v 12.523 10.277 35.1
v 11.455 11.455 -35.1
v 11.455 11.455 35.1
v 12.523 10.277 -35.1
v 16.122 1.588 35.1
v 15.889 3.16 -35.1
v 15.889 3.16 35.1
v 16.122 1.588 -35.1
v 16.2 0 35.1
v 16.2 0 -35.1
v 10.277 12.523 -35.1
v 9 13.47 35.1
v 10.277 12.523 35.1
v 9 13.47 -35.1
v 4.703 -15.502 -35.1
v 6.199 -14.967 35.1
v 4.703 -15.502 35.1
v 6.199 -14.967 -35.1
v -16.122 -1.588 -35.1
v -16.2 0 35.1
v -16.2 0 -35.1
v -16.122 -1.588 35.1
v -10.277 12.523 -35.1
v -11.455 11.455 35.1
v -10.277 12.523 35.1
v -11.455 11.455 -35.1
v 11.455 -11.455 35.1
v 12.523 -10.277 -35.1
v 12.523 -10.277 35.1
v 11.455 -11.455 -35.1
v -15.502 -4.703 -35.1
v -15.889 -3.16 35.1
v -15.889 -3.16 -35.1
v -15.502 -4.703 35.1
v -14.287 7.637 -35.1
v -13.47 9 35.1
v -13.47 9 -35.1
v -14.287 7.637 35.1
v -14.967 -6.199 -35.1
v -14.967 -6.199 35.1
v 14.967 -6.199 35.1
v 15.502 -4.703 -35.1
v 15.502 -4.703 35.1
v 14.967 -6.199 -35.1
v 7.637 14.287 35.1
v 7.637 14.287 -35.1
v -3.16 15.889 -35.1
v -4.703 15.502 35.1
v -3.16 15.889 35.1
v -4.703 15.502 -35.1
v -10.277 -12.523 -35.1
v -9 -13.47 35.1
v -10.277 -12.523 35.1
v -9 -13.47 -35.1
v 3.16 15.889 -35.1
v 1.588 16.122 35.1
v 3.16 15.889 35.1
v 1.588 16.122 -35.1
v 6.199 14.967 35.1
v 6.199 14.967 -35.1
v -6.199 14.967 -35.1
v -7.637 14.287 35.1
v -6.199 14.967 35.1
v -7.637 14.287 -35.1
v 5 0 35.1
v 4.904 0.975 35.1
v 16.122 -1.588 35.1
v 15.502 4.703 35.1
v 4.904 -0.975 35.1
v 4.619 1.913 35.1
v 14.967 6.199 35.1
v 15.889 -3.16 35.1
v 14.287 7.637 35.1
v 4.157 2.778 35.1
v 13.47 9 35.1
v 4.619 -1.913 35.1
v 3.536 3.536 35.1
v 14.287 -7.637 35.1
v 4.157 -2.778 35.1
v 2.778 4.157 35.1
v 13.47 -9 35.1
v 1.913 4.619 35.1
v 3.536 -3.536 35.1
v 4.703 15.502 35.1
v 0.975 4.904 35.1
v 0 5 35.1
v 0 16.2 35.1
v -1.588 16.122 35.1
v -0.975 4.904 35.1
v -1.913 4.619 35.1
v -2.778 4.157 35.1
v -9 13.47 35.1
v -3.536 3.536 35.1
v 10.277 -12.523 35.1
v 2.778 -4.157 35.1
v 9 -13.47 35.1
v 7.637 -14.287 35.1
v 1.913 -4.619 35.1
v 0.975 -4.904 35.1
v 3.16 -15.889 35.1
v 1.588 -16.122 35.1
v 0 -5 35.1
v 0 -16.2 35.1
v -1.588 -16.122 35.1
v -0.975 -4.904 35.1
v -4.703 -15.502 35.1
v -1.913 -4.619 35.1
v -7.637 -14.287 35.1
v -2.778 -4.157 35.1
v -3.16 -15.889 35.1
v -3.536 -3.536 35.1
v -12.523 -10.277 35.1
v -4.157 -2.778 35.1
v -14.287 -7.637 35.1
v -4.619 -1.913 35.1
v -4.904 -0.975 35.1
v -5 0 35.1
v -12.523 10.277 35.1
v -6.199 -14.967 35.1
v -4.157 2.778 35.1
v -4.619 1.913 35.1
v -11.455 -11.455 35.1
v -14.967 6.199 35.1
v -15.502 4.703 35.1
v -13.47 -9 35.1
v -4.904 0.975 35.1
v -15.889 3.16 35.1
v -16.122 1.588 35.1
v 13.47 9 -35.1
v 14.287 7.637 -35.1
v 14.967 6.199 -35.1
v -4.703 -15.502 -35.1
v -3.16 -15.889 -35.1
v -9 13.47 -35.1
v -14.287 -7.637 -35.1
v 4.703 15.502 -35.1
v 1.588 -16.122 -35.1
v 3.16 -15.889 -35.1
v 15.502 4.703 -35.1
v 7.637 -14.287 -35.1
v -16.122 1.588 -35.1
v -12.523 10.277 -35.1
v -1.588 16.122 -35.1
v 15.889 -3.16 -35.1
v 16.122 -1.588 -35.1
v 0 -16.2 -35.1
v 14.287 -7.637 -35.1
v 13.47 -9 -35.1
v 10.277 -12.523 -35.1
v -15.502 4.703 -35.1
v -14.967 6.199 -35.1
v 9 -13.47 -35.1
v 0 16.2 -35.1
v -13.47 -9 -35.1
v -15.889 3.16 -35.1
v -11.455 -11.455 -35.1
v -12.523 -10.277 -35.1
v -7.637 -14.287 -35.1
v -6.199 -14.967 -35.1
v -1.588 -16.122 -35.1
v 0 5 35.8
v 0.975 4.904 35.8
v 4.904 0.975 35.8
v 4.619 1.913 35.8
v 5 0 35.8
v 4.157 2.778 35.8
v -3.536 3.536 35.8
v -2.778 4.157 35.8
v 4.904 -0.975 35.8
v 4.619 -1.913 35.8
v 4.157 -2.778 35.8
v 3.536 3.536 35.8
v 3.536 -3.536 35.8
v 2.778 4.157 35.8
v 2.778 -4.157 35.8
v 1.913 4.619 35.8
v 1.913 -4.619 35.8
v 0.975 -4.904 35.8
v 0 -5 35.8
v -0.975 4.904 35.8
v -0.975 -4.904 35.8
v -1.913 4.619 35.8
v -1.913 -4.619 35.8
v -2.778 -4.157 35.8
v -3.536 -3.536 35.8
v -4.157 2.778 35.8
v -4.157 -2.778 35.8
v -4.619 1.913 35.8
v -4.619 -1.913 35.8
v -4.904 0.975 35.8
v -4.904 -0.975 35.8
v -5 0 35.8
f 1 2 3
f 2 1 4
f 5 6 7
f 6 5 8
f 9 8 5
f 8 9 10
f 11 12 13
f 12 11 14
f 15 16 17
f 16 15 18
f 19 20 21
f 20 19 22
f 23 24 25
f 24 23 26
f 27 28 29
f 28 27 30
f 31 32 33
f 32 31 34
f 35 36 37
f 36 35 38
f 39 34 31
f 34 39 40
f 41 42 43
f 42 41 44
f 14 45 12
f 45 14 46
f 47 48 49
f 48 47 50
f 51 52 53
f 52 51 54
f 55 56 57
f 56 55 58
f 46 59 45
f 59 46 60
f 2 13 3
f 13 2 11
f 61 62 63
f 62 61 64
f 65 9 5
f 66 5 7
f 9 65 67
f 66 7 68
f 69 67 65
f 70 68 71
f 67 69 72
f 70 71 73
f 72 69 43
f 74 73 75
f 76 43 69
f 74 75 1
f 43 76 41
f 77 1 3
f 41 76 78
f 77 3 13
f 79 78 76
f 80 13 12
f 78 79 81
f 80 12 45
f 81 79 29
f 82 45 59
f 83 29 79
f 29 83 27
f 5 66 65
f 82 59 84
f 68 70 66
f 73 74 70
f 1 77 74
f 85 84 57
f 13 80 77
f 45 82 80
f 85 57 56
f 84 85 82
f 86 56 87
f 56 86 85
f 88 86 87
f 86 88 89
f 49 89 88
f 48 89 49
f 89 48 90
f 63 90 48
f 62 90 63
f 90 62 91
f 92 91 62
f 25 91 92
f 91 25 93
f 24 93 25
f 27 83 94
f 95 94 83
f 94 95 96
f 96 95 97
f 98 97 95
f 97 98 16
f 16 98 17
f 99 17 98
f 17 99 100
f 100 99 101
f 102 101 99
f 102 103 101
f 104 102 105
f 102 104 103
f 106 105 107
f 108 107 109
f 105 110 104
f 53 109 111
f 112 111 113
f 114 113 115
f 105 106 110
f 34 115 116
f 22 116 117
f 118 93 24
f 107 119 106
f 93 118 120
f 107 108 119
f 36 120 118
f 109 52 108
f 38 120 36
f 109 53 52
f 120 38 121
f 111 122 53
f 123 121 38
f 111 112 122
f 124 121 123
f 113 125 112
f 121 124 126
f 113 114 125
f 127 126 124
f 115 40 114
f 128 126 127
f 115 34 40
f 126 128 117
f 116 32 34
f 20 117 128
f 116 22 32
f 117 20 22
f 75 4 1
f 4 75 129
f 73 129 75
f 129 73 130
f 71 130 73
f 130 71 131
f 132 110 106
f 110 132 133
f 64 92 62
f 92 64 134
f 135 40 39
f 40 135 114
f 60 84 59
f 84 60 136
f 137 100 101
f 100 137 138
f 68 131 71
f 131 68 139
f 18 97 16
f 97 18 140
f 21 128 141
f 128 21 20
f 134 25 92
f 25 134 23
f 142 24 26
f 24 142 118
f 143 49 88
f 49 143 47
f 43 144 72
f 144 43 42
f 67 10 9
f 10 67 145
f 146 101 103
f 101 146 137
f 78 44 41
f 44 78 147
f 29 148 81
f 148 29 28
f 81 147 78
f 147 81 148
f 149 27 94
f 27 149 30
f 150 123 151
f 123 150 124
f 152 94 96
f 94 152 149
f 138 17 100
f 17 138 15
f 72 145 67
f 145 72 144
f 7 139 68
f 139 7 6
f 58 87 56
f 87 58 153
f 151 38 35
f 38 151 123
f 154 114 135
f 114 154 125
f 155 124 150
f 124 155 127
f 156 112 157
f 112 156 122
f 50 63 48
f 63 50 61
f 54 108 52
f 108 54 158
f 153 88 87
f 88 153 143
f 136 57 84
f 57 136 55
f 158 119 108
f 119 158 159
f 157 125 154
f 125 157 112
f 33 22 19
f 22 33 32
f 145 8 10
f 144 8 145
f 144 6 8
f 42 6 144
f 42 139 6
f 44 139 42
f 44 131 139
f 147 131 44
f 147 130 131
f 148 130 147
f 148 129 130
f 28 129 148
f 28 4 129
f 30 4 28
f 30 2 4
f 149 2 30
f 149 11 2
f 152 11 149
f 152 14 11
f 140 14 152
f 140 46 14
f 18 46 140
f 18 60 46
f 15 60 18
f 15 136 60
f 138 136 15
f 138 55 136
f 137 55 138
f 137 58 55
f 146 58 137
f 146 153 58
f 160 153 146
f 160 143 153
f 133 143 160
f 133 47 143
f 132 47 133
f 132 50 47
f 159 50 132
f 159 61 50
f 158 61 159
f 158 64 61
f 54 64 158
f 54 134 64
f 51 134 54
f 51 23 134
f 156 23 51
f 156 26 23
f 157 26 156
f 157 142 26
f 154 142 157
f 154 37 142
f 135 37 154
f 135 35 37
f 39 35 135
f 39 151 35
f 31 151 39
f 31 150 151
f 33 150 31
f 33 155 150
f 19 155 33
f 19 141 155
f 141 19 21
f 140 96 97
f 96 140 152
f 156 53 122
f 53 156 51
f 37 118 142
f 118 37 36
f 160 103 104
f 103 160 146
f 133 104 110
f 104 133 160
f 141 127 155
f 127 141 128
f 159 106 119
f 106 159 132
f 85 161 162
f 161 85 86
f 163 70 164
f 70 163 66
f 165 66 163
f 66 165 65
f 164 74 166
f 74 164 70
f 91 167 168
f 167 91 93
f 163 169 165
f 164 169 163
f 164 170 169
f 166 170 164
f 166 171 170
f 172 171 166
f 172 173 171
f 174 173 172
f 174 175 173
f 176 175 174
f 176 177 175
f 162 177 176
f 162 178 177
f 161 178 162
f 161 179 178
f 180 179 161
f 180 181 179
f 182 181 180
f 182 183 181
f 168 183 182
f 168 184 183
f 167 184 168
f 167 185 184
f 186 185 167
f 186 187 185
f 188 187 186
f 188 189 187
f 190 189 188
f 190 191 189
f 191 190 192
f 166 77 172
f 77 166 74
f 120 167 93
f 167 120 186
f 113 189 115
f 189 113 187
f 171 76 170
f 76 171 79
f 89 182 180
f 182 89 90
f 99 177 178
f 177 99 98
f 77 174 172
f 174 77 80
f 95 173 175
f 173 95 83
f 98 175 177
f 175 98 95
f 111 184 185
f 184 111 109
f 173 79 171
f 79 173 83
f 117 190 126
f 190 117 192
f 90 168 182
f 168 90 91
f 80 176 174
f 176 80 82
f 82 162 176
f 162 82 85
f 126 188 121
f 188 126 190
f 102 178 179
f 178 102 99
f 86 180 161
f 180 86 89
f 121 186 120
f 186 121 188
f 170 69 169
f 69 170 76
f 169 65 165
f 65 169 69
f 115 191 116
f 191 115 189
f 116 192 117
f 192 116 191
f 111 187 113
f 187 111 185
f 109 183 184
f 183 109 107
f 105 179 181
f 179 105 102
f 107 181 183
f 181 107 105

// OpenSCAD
// Parameters
height_mm = 70.2; //[35.1:140.4:0.1]
diameter_mm = 32.4; //[16.2:64.8:0.1]
body_diameter_mm = 32.4; //[16.2:64.8:0.1]
body_height_mm = 70.2; //[35.1:140.4:0.1]
positive_terminal_diameter_mm = 10; //[5:20:0.1]
positive_terminal_height_mm = 1.5; //[0.75:3:0.1]
negative_terminal_diameter_mm = 12; //[6:24:0.1]
negative_terminal_height_mm = 0.3; //[0.15:0.6:0.05]
edge_fillet_radius_mm = 0.5; //[0.25:1:0.05]
overlap_mm = 0.8; //[0.5:2:0.1]
endcap_height_mm = 0.5; //[0.25:1.5:0.05]

// Battery - complete geometry
module battery() {
  color("DimGray") {
    union() {
      // Main cylindrical body
      translate([0, 0, 0])
        cylinder(h=body_height_mm, r=body_diameter_mm/2, center=true, $fn=64);

      // Positive terminal button
      translate([0, 0, body_height_mm/2 + positive_terminal_height_mm/2 - overlap_mm])
        cylinder(h=positive_terminal_height_mm, r=positive_terminal_diameter_mm/2, center=true, $fn=32);

      // Negative terminal contact
      translate([0, 0, -body_height_mm/2 - negative_terminal_height_mm/2 + overlap_mm])
        cylinder(h=negative_terminal_height_mm, r=negative_terminal_diameter_mm/2, center=true, $fn=32);

      // Positive endcap rounding
      translate([0, 0, body_height_mm/2 + endcap_height_mm/2 - overlap_mm])
        cylinder(h=endcap_height_mm, r=body_diameter_mm/2, center=true, $fn=64);

      // Negative endcap rounding
      translate([0, 0, -body_height_mm/2 - endcap_height_mm/2 + overlap_mm])
        cylinder(h=endcap_height_mm, r=body_diameter_mm/2, center=true, $fn=64);
    }
  }
}

// Assembly
module assembly() {
  battery();
}

assembly();
